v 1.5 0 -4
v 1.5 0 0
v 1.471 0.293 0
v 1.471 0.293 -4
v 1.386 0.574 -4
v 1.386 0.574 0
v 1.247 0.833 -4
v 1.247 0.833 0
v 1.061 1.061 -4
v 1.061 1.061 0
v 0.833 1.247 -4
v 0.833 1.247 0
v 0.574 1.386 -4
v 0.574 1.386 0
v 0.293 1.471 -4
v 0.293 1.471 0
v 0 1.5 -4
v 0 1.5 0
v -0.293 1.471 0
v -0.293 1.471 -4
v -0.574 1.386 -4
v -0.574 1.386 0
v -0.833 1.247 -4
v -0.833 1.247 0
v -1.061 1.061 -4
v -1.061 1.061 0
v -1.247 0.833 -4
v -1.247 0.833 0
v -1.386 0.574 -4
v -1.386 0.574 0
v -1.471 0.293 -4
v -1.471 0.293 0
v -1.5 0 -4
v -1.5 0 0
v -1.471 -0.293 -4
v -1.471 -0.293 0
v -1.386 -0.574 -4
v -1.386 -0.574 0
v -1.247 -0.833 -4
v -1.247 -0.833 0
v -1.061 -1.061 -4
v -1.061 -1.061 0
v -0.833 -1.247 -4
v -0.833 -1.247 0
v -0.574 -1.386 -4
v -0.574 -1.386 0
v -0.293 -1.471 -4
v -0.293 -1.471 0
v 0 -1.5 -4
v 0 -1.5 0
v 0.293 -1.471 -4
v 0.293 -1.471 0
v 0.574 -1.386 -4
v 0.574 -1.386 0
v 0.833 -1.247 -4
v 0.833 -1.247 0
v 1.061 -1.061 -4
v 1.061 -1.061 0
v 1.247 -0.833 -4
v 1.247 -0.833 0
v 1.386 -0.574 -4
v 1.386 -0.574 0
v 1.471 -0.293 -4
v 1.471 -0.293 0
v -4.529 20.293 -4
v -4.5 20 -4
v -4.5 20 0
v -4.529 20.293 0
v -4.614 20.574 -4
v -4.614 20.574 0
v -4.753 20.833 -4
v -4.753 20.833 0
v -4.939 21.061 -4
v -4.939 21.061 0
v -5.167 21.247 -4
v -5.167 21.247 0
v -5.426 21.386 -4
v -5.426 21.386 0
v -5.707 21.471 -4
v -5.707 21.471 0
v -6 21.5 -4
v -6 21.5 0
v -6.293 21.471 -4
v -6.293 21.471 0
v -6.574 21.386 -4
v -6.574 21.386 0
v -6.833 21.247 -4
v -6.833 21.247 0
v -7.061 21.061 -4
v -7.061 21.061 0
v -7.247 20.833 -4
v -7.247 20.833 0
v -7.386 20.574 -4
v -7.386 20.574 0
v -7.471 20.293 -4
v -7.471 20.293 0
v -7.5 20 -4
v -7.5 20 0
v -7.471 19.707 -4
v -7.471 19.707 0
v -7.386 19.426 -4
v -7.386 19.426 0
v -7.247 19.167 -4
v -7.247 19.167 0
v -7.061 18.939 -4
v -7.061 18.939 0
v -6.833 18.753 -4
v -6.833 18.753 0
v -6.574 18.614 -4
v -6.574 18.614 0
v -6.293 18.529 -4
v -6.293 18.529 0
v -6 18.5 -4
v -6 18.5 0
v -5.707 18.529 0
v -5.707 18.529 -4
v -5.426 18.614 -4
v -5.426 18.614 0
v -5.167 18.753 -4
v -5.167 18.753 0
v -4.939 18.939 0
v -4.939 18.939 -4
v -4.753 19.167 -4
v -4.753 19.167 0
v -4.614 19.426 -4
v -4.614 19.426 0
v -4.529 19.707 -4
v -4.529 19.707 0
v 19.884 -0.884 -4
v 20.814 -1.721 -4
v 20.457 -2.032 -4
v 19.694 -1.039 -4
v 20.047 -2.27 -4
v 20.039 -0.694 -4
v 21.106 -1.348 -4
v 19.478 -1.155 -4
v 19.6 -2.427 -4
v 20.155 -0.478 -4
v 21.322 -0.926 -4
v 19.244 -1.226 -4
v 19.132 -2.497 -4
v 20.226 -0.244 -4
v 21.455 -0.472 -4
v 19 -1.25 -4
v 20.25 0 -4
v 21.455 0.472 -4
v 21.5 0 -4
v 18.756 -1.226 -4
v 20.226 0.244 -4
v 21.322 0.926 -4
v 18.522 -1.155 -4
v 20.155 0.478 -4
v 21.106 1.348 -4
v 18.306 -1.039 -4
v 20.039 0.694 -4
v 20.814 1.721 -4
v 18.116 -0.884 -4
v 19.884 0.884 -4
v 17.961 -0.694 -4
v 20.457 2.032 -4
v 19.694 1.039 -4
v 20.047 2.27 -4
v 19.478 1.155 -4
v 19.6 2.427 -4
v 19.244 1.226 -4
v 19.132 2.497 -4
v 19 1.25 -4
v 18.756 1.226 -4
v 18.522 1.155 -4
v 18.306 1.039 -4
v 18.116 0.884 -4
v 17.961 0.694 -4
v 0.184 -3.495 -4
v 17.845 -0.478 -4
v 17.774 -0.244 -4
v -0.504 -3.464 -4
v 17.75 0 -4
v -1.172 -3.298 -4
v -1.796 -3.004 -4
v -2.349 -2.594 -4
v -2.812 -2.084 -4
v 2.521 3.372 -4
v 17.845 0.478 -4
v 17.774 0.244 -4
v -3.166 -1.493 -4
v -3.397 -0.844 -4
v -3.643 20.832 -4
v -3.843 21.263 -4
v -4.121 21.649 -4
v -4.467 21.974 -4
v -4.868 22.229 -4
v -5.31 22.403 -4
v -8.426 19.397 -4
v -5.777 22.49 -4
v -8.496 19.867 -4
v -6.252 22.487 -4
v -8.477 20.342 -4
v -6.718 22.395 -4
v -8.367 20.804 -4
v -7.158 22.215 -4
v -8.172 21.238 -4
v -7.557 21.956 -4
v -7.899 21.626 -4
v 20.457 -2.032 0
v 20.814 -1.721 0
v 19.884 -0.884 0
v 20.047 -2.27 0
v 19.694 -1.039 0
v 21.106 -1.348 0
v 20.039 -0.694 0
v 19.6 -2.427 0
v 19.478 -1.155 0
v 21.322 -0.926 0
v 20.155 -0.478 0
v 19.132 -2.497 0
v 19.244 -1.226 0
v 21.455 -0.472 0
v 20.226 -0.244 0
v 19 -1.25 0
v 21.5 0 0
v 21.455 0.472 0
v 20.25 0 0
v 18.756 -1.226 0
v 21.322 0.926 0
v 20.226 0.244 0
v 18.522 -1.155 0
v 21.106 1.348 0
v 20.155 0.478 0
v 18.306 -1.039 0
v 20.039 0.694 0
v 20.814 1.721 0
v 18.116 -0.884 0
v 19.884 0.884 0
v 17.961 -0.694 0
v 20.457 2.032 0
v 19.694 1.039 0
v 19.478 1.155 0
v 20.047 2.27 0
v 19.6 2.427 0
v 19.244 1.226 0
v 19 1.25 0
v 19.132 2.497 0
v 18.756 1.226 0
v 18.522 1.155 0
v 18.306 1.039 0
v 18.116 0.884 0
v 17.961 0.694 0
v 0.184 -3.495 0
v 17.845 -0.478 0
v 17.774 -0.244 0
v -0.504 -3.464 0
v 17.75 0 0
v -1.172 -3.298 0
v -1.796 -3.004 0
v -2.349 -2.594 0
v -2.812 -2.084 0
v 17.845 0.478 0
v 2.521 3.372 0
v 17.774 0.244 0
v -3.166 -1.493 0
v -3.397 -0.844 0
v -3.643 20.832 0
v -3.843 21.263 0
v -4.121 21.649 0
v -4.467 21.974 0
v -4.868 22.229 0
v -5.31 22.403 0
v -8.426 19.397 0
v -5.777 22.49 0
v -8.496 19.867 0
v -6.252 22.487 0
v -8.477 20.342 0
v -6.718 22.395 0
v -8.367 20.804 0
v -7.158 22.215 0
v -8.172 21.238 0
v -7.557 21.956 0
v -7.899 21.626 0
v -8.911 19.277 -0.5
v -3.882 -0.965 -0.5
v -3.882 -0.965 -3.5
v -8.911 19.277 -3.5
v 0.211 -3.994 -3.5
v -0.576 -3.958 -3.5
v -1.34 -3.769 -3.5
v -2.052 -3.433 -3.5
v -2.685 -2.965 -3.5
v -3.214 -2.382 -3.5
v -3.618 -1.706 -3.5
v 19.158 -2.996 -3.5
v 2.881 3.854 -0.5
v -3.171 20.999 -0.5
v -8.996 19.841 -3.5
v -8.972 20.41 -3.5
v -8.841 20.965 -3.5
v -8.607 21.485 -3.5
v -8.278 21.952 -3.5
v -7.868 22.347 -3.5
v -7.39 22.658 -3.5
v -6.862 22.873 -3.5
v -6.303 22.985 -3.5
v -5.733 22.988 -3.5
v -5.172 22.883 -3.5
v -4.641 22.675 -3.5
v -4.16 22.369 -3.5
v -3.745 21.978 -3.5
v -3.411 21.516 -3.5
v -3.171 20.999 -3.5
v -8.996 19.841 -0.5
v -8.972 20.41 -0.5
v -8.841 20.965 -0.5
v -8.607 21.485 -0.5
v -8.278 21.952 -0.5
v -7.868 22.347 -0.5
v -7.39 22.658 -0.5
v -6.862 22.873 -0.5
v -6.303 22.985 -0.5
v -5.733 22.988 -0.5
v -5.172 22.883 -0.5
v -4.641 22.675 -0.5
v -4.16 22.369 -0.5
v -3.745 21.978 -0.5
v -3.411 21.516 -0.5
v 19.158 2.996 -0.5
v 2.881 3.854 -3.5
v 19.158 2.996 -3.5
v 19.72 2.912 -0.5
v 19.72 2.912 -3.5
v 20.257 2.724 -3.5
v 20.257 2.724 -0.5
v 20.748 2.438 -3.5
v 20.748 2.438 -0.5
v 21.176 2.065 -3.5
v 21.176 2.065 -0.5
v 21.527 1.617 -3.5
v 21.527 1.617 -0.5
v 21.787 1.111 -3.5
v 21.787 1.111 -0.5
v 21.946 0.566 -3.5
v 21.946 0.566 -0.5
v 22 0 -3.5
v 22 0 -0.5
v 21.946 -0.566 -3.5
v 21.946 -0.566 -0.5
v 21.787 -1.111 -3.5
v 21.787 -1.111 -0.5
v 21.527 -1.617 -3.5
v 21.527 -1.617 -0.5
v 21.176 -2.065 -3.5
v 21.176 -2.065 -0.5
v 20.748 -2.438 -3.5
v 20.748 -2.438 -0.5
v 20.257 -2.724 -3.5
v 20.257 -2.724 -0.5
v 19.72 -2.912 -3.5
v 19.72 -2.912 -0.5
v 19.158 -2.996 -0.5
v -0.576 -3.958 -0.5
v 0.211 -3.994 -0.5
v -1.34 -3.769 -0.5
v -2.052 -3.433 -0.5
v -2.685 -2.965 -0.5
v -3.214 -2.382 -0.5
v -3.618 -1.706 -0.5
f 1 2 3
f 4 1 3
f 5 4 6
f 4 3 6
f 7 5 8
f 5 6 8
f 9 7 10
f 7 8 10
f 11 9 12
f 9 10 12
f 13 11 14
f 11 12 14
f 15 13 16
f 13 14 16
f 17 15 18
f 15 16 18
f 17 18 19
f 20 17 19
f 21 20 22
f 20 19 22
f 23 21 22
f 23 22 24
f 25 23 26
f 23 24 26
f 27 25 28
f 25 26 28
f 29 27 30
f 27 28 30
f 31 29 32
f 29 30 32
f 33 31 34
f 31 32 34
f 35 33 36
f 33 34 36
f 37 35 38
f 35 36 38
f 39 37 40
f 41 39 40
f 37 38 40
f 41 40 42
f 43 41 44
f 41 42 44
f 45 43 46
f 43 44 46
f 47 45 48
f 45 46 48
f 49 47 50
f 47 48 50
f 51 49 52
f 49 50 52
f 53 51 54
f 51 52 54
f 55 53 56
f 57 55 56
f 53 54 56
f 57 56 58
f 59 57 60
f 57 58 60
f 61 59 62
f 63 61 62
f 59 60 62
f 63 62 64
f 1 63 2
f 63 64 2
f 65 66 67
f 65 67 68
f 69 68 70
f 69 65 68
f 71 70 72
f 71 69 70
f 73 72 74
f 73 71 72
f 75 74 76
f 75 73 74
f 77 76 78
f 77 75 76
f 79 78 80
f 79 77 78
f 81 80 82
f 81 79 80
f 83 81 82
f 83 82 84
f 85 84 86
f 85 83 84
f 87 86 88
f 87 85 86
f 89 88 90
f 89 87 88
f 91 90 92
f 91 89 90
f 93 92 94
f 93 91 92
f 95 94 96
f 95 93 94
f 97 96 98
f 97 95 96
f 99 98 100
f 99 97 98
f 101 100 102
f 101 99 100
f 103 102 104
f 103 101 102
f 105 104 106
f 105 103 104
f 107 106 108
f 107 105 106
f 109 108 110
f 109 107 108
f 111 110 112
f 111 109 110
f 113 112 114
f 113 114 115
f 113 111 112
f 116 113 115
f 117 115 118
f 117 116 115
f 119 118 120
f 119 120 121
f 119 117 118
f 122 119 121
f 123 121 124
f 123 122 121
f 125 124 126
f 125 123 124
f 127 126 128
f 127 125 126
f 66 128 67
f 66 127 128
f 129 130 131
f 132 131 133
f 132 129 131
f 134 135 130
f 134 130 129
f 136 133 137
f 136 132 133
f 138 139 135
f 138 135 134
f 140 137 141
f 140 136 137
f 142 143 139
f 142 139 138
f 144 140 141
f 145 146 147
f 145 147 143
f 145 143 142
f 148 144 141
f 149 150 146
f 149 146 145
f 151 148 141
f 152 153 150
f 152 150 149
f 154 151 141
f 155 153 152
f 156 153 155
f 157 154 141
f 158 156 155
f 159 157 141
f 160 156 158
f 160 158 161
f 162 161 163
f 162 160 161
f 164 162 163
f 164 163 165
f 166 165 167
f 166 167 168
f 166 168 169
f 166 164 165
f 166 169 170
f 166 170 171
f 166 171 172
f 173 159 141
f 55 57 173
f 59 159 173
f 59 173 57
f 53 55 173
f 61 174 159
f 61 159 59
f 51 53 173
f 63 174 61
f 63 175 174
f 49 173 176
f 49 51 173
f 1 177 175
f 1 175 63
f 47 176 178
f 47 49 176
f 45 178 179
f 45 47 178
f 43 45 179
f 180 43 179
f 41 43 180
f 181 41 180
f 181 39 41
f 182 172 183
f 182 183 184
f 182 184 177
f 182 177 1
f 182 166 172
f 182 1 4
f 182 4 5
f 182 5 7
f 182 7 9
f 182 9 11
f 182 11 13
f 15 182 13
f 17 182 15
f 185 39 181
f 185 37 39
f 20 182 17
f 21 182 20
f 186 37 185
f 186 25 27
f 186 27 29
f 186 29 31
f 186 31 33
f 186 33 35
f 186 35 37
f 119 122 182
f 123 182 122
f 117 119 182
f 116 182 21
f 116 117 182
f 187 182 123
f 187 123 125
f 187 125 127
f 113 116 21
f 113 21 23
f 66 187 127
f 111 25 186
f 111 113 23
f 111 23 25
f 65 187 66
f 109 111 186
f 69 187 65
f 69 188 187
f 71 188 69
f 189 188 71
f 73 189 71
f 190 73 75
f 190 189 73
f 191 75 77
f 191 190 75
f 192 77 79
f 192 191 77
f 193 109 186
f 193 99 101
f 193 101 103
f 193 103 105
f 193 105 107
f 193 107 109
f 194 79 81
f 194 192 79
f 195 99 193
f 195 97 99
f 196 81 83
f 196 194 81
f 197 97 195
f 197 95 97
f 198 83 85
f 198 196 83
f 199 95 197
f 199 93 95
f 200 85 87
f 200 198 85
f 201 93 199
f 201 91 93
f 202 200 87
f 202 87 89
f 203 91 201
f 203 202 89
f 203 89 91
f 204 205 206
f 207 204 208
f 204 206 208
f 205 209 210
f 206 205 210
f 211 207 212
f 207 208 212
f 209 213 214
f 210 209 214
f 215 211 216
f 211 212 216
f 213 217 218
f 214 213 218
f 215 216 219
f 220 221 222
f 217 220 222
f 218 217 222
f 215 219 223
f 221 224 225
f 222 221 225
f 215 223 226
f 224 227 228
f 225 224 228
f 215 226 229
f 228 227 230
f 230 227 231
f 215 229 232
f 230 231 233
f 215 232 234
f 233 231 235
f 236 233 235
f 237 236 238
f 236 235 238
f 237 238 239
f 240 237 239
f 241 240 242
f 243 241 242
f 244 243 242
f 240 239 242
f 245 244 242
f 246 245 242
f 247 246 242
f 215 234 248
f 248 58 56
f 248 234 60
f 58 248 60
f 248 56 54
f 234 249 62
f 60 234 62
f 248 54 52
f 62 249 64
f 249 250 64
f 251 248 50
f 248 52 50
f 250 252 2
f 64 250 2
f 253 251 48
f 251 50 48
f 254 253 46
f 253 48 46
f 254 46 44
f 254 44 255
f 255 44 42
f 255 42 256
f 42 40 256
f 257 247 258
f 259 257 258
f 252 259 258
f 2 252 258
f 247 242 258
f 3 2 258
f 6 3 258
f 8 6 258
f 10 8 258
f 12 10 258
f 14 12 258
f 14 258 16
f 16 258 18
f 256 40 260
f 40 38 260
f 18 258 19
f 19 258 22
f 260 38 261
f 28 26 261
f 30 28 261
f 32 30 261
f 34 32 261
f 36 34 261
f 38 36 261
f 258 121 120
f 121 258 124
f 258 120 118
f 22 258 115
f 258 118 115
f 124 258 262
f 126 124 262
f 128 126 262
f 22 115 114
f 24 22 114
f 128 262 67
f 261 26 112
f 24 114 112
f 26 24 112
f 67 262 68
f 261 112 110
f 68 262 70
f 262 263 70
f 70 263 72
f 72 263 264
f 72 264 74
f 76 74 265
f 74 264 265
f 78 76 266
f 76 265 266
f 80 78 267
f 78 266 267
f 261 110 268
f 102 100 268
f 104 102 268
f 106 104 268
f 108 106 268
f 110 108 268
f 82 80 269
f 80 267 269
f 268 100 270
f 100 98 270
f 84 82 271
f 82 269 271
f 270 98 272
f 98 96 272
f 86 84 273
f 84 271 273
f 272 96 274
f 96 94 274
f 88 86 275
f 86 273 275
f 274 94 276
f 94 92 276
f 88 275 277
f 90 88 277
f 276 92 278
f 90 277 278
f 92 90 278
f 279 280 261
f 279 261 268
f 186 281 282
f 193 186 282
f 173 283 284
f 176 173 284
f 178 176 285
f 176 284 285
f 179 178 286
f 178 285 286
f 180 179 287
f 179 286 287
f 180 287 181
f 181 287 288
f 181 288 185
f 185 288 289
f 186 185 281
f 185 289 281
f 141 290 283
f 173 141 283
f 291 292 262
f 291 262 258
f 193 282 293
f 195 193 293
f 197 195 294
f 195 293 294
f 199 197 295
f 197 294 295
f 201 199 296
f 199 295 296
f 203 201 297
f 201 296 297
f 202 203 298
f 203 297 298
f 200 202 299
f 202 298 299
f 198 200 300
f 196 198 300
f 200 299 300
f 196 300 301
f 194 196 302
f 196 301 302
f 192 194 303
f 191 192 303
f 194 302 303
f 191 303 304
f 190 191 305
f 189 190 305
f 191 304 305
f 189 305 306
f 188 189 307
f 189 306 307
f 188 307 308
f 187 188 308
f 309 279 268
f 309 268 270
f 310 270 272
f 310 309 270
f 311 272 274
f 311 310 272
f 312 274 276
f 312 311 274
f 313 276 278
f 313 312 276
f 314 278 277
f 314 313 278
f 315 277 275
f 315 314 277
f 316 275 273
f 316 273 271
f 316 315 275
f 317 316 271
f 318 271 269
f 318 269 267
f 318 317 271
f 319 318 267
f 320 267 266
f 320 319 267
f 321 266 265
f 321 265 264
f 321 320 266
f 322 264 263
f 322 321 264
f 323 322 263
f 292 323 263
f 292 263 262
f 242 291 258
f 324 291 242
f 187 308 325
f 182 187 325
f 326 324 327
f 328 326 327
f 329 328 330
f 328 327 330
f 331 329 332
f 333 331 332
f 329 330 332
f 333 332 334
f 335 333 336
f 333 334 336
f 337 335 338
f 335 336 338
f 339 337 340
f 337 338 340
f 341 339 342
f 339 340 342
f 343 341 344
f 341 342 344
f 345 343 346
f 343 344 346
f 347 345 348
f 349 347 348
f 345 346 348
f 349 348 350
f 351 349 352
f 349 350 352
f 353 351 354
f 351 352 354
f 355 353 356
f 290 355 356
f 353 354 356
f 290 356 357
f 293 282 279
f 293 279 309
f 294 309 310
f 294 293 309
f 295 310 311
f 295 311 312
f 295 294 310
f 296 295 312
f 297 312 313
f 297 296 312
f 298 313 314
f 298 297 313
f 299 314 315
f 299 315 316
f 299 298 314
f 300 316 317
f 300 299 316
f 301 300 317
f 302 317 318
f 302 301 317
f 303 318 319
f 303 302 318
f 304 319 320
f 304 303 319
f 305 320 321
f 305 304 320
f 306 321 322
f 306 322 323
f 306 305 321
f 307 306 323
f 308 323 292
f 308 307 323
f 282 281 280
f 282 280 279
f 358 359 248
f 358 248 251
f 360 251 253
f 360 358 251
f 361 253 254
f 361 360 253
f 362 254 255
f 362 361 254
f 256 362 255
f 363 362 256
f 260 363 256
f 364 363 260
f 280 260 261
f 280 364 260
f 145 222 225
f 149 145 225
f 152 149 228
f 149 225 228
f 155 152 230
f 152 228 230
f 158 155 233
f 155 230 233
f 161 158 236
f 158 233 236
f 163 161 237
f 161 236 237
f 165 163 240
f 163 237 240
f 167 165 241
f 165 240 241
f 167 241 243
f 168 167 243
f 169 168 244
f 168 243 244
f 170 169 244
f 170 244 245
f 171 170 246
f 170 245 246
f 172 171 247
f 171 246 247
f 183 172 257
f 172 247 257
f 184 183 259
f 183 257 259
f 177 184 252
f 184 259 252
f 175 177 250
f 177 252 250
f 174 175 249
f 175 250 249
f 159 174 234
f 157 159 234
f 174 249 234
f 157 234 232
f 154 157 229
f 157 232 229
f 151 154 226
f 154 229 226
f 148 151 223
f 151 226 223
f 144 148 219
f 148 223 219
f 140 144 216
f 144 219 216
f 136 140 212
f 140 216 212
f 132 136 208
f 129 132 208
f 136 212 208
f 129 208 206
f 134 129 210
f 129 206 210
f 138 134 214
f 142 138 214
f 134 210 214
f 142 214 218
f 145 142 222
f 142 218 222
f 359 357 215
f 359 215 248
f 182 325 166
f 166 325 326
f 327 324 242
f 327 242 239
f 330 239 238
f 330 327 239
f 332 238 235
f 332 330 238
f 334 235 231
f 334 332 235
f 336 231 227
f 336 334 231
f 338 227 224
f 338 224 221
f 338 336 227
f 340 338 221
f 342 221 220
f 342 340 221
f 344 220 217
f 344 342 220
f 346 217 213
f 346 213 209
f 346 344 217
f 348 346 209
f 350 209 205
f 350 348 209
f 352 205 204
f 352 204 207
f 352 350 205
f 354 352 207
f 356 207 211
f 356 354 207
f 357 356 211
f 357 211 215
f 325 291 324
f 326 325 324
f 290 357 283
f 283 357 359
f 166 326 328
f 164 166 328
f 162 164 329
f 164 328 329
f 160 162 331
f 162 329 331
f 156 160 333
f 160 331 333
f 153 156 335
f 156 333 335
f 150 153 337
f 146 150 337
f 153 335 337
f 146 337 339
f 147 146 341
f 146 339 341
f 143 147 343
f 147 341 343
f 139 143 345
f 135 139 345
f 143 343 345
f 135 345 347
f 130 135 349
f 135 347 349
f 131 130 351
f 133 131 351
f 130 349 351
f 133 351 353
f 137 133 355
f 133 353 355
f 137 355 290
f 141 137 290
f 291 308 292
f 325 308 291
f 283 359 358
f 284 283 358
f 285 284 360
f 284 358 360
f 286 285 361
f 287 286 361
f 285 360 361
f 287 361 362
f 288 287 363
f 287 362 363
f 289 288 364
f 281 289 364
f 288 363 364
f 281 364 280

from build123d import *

# Parameters (mm, degrees)
CROQUIS7_R              = 3
CROQUIS7_R_2            = 1.5
SALIENTE_EXTRUIR4_DEPTH = 4
CROQUIS9_R              = 1.5
CROQUIS9_R_2            = 1.25
SALIENTE_EXTRUIR5_DEPTH = 4
CROQUIS2_R              = 3.020046414
CROQUIS2_R_2            = 1.5
SALIENTE_EXTRUIR2_DEPTH = 4
CHAFL_N1_SIZE           = 0.5


with BuildPart() as part:
    # Croquis7 → Saliente-Extruir4 (new body)
    with BuildSketch(Plane.XY):
        Circle(CROQUIS7_R)
        Circle(CROQUIS7_R_2, mode=Mode.SUBTRACT)
    extrude(amount=-SALIENTE_EXTRUIR4_DEPTH)

    # Croquis9 → Saliente-Extruir5 (add)
    with BuildSketch(Plane.XY):
        with BuildLine():
            Line((0.210526316, 3.994455992), (19.157894737, 2.995841994))
            ThreePointArc((19.157894737, 2.995841994), (22, 0), (19.157894737, -2.995841994))
            Line((19.157894737, -2.995841994), (0.210526316, -3.994455992))
            ThreePointArc((0.210526316, -3.994455992), (-4, 0), (0.210526316, 3.994455992))
        make_face()
        Circle(CROQUIS9_R, mode=Mode.SUBTRACT)
        with Locations((19, 0)):
            Circle(CROQUIS9_R_2, mode=Mode.SUBTRACT)
    extrude(amount=-SALIENTE_EXTRUIR5_DEPTH)

    # Croquis2 → Saliente-Extruir2 (add, through all)
    with BuildSketch(Plane.XY.offset(-4)):
        with BuildLine():
            Line((-3.171102714, 20.998669186), (3.771863049, 1.331558915))
            ThreePointArc((3.771863049, 1.331558915), (1.149391542, -3.831305141), (-3.881954792, -0.964586438))
            Line((-3.881954792, -0.964586438), (-8.911466094, 19.276560172))
            ThreePointArc((-8.911466094, 19.276560172), (-6.862043657, 22.873478856), (-3.171102714, 20.998669186))
        make_face()
        Circle(CROQUIS2_R, mode=Mode.SUBTRACT)
        with Locations((-6, 20)):
            Circle(CROQUIS2_R_2, mode=Mode.SUBTRACT)
    extrude(amount=SALIENTE_EXTRUIR2_DEPTH)

    # Chaflán1
    chafl_n1_edges = [part.edges().sort_by_distance(p)[0] for p in [
        (11.01969335, 3.424762868, -4),
        (22, 0, -4),
        (9.684210526, -3.495148993, -4),
        (9.684210526, -3.495148993, 0),
        (22, 0, 0),
        (11.01969335, 3.424762868, 0),
        (-2.380099608, -3.214829056, 0),
        (-2.380099608, -3.214829056, -4),
        (-6.396710443, 9.155986867, 0),
        (-0.144805375, 12.426176464, 0),
        (-6.862043657, 22.873478856, 0),
        (-6.862043657, 22.873478856, -4),
        (-6.396710443, 9.155986867, -4),
        (-0.144805375, 12.426176464, -4),
    ]]
    chamfer(chafl_n1_edges, length=CHAFL_N1_SIZE)


solid = part.part
